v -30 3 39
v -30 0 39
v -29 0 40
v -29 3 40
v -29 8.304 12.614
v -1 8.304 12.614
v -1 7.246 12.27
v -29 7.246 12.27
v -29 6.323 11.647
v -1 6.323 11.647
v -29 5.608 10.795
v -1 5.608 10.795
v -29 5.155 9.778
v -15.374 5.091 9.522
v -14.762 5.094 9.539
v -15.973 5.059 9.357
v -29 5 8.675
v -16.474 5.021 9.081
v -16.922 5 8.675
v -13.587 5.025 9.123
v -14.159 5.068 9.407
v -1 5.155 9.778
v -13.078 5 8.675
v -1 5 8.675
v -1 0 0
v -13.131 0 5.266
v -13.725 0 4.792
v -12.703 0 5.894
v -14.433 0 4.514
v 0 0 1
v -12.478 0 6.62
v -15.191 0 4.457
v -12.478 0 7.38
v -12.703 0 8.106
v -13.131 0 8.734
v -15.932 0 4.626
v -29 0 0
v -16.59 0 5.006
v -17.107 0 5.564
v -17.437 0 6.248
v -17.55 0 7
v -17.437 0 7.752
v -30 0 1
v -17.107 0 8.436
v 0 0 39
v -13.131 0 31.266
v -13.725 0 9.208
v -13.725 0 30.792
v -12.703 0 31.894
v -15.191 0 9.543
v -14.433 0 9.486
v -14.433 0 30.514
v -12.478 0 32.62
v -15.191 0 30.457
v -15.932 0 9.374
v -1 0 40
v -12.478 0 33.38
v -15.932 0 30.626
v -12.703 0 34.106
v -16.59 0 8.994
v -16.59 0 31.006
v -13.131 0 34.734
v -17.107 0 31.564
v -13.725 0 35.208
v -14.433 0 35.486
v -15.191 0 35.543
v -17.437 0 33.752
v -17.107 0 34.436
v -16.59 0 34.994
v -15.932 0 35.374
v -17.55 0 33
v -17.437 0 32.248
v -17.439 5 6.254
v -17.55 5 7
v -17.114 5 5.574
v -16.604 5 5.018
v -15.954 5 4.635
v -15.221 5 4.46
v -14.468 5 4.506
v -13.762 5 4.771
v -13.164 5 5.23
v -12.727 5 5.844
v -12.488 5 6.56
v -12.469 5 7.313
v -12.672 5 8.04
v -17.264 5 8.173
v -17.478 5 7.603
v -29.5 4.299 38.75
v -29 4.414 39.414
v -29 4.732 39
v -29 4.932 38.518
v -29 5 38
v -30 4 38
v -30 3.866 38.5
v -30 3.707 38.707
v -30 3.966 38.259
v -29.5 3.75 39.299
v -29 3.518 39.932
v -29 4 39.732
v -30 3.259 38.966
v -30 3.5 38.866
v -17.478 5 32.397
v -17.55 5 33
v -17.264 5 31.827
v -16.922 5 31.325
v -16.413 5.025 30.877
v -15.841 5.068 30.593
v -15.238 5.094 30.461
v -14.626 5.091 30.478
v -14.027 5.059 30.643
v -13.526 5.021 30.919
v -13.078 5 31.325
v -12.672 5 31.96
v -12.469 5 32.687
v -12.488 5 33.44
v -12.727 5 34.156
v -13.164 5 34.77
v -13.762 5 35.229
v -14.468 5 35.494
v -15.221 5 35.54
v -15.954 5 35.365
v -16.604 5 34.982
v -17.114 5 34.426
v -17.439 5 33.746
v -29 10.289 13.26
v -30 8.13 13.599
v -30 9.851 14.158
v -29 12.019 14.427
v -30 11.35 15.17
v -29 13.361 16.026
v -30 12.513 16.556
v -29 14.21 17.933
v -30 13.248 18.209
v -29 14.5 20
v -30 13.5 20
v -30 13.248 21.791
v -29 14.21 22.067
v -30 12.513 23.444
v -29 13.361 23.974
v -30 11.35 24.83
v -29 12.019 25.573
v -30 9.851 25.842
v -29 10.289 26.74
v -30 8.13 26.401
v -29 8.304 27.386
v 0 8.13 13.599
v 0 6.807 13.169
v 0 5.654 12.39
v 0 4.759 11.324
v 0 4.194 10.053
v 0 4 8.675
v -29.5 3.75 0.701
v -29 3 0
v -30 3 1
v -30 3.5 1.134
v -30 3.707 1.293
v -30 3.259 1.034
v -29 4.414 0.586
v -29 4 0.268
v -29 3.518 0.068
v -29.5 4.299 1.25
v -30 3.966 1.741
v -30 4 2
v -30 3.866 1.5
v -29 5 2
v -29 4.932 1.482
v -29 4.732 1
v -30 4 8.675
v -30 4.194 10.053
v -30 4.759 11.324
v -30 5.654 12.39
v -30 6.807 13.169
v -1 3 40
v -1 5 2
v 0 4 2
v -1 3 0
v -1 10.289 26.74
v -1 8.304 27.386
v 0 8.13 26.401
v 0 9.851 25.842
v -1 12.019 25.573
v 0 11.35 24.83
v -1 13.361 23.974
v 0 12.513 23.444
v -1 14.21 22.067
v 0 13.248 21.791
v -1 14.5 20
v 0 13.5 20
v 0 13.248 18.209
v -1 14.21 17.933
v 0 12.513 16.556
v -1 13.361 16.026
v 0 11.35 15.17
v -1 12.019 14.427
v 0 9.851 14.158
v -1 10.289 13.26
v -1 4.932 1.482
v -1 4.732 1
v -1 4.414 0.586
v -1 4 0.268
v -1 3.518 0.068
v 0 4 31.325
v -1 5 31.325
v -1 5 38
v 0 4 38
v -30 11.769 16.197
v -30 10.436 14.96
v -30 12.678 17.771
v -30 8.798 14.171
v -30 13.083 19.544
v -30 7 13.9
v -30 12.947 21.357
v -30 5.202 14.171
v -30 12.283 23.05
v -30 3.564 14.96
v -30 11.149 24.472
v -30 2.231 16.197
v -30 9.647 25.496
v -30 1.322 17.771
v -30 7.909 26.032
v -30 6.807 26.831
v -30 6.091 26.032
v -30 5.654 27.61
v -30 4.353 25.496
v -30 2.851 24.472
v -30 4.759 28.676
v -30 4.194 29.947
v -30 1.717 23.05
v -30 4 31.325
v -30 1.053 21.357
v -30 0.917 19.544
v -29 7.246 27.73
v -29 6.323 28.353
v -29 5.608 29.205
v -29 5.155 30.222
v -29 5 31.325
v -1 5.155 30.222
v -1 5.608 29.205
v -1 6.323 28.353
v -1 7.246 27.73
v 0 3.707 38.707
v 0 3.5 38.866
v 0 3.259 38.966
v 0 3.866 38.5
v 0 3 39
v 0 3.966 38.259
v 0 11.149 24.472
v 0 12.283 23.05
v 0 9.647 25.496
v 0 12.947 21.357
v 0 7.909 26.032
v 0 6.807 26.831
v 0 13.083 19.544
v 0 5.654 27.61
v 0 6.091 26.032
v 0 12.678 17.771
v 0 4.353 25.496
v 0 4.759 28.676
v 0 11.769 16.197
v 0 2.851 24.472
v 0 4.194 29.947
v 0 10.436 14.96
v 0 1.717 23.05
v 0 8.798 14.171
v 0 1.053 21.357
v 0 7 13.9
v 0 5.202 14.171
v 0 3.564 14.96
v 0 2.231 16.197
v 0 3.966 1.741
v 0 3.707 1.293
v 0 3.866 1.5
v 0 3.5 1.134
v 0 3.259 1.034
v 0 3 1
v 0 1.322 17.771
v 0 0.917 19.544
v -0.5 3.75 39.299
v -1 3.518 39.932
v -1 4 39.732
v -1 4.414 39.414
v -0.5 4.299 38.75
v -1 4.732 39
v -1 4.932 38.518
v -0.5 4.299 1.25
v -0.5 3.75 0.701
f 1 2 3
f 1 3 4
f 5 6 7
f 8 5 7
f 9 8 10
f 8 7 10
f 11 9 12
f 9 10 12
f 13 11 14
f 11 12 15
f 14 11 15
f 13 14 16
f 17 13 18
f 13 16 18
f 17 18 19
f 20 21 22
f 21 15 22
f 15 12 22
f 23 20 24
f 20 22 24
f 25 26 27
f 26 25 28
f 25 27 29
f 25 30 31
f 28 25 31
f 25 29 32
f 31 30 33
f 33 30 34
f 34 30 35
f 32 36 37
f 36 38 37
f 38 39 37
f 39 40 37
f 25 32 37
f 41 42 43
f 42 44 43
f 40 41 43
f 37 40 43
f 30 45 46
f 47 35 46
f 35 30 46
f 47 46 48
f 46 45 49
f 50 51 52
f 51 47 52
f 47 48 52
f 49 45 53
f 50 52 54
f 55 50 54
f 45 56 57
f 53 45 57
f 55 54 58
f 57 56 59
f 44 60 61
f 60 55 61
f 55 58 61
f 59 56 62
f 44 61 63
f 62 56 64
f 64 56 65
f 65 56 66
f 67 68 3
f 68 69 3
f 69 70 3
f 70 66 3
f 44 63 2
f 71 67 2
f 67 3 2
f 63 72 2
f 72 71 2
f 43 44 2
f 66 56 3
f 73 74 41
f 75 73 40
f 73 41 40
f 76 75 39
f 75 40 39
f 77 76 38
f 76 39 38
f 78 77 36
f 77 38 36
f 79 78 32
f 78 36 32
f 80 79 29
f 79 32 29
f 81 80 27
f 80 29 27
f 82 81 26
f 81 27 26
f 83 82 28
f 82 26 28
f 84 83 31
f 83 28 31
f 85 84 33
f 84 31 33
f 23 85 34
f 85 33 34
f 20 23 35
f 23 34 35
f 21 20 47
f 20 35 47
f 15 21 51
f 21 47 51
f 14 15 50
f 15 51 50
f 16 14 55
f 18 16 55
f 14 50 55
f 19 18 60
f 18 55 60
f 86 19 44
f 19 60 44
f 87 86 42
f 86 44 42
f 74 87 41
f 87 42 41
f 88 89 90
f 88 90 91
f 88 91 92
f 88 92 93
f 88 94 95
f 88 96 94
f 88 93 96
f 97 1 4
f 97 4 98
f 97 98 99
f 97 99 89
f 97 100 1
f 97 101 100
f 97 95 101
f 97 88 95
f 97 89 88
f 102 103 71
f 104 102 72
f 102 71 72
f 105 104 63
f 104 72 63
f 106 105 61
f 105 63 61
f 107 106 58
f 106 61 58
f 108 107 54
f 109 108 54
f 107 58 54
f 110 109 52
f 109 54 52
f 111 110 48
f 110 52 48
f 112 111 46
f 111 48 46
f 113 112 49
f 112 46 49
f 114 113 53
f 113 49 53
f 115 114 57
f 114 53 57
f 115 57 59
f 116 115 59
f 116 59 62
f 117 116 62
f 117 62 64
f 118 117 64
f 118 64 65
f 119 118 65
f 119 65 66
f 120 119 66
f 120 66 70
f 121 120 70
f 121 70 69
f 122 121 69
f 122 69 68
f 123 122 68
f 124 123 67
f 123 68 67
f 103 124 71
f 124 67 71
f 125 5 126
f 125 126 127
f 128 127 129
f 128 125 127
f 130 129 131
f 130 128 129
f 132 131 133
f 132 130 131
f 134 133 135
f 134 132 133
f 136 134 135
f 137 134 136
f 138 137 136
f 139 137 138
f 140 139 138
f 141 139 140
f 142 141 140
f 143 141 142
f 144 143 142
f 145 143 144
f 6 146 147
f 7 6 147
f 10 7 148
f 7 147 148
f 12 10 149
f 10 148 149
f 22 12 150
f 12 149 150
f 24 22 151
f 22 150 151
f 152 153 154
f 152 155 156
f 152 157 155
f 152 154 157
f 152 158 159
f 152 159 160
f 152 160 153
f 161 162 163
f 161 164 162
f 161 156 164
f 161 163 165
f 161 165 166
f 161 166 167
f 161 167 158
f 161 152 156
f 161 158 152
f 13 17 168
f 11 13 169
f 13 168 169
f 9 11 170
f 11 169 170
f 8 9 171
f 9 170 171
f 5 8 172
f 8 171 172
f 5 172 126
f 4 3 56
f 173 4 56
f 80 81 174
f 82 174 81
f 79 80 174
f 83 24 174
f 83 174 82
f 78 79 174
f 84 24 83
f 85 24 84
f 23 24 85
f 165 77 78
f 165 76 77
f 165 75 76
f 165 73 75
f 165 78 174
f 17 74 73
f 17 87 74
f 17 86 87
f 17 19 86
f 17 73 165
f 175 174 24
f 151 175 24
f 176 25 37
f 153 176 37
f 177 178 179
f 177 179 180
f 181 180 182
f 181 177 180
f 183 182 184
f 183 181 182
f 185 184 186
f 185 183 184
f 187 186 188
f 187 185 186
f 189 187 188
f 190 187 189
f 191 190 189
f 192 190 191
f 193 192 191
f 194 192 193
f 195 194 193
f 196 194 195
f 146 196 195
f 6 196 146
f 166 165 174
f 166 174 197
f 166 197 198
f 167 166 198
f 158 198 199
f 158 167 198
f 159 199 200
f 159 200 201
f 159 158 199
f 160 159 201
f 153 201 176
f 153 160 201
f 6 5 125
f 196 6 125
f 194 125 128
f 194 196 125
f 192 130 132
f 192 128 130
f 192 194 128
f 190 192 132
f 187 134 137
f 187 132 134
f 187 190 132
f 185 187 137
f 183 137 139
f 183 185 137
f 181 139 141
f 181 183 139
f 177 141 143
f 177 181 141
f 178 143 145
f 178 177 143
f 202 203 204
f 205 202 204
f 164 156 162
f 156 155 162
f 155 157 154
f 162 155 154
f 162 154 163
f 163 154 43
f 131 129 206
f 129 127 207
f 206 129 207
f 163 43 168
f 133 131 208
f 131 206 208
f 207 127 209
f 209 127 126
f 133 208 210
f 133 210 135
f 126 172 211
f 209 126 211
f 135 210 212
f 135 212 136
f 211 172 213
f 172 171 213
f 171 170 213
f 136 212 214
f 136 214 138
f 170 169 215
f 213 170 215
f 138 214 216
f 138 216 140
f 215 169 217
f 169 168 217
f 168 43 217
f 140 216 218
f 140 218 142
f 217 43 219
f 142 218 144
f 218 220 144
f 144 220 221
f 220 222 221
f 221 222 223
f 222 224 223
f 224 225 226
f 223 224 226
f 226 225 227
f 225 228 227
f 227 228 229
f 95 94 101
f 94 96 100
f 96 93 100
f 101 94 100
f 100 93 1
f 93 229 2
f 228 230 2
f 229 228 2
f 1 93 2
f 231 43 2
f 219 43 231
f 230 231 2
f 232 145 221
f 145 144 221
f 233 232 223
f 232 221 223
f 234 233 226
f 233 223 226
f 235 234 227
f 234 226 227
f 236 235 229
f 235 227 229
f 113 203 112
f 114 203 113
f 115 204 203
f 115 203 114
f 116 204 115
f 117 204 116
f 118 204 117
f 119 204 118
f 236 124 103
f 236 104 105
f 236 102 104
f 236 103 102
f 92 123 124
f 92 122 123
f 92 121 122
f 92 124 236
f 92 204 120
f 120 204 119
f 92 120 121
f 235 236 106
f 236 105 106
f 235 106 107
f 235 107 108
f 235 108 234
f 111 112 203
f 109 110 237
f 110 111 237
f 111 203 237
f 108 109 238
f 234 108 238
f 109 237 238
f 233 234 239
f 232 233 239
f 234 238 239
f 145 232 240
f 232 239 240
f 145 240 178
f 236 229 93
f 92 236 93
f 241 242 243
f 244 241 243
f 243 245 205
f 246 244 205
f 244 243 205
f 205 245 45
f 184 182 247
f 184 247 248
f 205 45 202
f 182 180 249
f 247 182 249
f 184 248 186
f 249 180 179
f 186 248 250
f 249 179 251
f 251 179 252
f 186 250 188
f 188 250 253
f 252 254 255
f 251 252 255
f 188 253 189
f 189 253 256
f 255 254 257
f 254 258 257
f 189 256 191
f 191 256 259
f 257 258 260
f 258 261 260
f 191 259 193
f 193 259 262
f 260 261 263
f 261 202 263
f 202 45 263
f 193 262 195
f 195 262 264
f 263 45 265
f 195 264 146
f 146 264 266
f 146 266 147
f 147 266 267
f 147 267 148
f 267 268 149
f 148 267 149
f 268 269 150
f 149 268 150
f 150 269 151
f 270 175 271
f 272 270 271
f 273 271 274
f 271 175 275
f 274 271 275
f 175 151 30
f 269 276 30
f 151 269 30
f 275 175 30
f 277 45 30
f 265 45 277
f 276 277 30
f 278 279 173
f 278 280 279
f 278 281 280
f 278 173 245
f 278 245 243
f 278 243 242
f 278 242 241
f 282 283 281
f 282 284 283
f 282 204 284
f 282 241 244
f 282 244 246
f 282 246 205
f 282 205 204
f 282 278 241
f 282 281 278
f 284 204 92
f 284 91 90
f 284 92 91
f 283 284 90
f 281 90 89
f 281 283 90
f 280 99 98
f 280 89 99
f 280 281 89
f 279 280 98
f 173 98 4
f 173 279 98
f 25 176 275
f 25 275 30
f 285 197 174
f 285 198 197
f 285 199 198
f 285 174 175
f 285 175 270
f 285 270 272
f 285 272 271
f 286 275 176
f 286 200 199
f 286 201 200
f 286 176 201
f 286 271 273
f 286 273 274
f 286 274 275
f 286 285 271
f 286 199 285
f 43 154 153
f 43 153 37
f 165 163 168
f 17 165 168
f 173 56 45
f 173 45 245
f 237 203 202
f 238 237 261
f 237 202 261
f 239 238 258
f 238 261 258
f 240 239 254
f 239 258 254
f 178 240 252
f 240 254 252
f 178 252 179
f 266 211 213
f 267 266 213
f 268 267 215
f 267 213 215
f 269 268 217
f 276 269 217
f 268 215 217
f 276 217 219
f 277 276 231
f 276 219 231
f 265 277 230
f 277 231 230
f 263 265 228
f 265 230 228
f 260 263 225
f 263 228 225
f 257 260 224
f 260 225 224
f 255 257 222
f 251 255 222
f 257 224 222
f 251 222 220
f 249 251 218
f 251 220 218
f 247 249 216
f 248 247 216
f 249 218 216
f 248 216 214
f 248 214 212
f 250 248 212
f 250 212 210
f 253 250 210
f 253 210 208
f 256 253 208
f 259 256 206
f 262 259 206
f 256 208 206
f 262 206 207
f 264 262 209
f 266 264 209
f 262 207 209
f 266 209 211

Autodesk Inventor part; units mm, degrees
ref_plane "YZ Plane" through (0, 0, 0) normal (1, 0, 0) x (0, 1, 0)
ref_plane "XZ Plane" through (0, 0, 0) normal (0, 1, 0) x (-1, 0, 0)
ref_plane "XY Plane" through (0, 0, 0) normal (0, 0, 1) x (1, 0, 0)
sketch "Skizze1" plane through (0, 0, 0) normal (0, 1, 0) x (-1, 0, 0)
  line L0 (0, 0) -> (30, 0)
  line L1 (30, 0) -> (30, 40)
  line L2 (30, 40) -> (0, 40)
  line L3 (0, 40) -> (0, 0)
  circle A0 centre (15, 33) radius 2.55
  circle A1 centre (15, 7) radius 2.55
  dimension "d0" = 30
  dimension "d1" = 40
  dimension "d2" = 5.1
  dimension "d3" = 5.1
  dimension "d4" = 7
  dimension "d5" = 7
  dimension "d6" = 15
  dimension "d7" = 15
extrude "Baseplate" add sketch "Skizze1" along normal blind 5
sketch "Skizze2" plane through (0, 0, 40) normal (1, 0, 0) x (0, 0, -1)
  arc A0 (27.2284, 5) -> (12.7716, 5) centre (20, 7) ccw
  line L0 (40, 0) -> (40, 5) projected
  line L1 (0, 5) -> (40, 5) projected
  line L2 (12.7716, 5) -> (27.2284, 5)
  line L3 (40, 5) -> (0, 5) projected
  dimension "d10" = 15
  dimension "d12" = 20
  dimension "d13" = 2
extrude "Rounding" add sketch "Skizze2" against normal up to surface (30 mm away)
sketch "Skizze3" plane through (0, 0, 40) normal (1, 0, 0) x (0, 0, -1)
  line L0 (40, 0) -> (40, 5) projected
  line L1 (27.2284, 5) -> (40, 5) projected
  circle A0 centre (20, 7) radius 4.05
  dimension "d17" = 20
  dimension "d18" = 2
  dimension "d19" = 8.1
hole "Sensor" at (0, 7, 20) direction (-1, 0, 0) diameter 12.2 end through all
fillet "Rundung1" radius 4 2 edges at (-15, 5, 27.2284) (-15, 5, 12.7716)
fillet "Rundung2" radius 2 2 edges at (-15, 5, 0) (-15, 5, 40)
chamfer "Fase1" distance 1 angle 45 18 edges at (0, 1.5, 40) (0, 4.4142, 39.4142) (0, 5, 34.6624) (0, 5.9355, 28.754) (0, 5.9355, 11.246) (0, 14.5, 20) (0, 5, 5.3376) (0, 4.4142, 0.5858) (0, 1.5, 0) (-30, 5.9355, 28.754) (-30, 5.9355, 11.246) (-30, 14.5, 20) (-30, 5, 34.6624) (-30, 4.4142, 39.4142) (-30, 1.5, 40) (-30, 5, 5.3376) (-30, 4.4142, 0.5858) (-30, 1.5, 0)
equation "\"d3\" = d2"
equation "\"d5\" = d4"
properties part number "Prox_Z_3030"
